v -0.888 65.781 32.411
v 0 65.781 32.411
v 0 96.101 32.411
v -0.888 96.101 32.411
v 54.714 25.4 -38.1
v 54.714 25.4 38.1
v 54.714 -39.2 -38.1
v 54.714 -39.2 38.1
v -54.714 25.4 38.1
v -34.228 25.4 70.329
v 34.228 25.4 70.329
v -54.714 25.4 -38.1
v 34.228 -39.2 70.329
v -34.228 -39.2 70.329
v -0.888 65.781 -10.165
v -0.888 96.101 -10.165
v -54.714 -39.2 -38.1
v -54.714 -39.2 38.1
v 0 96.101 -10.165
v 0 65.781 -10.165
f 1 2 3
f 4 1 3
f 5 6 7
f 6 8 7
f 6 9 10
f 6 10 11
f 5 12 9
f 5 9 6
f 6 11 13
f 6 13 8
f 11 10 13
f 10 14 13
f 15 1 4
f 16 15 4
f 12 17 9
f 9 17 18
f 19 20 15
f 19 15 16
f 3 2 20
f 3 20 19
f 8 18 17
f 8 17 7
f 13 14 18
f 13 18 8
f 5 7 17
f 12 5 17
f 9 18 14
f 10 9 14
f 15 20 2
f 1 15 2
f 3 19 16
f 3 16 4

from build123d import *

# Parameters (mm, degrees)
F0_W     = 109.428194
F0_H     = 76.2
F1_DEPTH = 39.19995
F3_DEPTH = 25.4
F4_W     = 30.319728
F4_H     = 42.576271
F5_DEPTH = 0.888


with BuildPart() as f1:
    # F0 (on Front) → F1 (new body)
    with BuildSketch(Plane.XZ):
        Polygon((-34.227538, 70.328853), (-54.714097, 38.1), (54.714097, 38.1), (34.227538, 70.328853), align=None)
        Rectangle(F0_W, F0_H)
    extrude(amount=F1_DEPTH)

    # F1_face (on face) → F3 (join)
    with BuildSketch(Plane(origin=(0, 0, 13.552836), x_dir=(1, 0, 0), z_dir=(0, 1, 0))):
        Polygon((-54.714097, -24.547164), (-34.227538, -56.776017), (34.227538, -56.776017), (54.714097, -24.547164), (54.714097, 51.652836), (-54.714097, 51.652836), align=None)
    extrude(amount=F3_DEPTH)


with BuildPart() as f5:
    # F4 (on Right) → F5 (new body)
    with BuildSketch(Plane.YZ):
        with Locations((80.941256, 11.123361)):
            Rectangle(F4_W, F4_H)
    extrude(amount=-F5_DEPTH)


solid = Compound([f1.part, f5.part])
